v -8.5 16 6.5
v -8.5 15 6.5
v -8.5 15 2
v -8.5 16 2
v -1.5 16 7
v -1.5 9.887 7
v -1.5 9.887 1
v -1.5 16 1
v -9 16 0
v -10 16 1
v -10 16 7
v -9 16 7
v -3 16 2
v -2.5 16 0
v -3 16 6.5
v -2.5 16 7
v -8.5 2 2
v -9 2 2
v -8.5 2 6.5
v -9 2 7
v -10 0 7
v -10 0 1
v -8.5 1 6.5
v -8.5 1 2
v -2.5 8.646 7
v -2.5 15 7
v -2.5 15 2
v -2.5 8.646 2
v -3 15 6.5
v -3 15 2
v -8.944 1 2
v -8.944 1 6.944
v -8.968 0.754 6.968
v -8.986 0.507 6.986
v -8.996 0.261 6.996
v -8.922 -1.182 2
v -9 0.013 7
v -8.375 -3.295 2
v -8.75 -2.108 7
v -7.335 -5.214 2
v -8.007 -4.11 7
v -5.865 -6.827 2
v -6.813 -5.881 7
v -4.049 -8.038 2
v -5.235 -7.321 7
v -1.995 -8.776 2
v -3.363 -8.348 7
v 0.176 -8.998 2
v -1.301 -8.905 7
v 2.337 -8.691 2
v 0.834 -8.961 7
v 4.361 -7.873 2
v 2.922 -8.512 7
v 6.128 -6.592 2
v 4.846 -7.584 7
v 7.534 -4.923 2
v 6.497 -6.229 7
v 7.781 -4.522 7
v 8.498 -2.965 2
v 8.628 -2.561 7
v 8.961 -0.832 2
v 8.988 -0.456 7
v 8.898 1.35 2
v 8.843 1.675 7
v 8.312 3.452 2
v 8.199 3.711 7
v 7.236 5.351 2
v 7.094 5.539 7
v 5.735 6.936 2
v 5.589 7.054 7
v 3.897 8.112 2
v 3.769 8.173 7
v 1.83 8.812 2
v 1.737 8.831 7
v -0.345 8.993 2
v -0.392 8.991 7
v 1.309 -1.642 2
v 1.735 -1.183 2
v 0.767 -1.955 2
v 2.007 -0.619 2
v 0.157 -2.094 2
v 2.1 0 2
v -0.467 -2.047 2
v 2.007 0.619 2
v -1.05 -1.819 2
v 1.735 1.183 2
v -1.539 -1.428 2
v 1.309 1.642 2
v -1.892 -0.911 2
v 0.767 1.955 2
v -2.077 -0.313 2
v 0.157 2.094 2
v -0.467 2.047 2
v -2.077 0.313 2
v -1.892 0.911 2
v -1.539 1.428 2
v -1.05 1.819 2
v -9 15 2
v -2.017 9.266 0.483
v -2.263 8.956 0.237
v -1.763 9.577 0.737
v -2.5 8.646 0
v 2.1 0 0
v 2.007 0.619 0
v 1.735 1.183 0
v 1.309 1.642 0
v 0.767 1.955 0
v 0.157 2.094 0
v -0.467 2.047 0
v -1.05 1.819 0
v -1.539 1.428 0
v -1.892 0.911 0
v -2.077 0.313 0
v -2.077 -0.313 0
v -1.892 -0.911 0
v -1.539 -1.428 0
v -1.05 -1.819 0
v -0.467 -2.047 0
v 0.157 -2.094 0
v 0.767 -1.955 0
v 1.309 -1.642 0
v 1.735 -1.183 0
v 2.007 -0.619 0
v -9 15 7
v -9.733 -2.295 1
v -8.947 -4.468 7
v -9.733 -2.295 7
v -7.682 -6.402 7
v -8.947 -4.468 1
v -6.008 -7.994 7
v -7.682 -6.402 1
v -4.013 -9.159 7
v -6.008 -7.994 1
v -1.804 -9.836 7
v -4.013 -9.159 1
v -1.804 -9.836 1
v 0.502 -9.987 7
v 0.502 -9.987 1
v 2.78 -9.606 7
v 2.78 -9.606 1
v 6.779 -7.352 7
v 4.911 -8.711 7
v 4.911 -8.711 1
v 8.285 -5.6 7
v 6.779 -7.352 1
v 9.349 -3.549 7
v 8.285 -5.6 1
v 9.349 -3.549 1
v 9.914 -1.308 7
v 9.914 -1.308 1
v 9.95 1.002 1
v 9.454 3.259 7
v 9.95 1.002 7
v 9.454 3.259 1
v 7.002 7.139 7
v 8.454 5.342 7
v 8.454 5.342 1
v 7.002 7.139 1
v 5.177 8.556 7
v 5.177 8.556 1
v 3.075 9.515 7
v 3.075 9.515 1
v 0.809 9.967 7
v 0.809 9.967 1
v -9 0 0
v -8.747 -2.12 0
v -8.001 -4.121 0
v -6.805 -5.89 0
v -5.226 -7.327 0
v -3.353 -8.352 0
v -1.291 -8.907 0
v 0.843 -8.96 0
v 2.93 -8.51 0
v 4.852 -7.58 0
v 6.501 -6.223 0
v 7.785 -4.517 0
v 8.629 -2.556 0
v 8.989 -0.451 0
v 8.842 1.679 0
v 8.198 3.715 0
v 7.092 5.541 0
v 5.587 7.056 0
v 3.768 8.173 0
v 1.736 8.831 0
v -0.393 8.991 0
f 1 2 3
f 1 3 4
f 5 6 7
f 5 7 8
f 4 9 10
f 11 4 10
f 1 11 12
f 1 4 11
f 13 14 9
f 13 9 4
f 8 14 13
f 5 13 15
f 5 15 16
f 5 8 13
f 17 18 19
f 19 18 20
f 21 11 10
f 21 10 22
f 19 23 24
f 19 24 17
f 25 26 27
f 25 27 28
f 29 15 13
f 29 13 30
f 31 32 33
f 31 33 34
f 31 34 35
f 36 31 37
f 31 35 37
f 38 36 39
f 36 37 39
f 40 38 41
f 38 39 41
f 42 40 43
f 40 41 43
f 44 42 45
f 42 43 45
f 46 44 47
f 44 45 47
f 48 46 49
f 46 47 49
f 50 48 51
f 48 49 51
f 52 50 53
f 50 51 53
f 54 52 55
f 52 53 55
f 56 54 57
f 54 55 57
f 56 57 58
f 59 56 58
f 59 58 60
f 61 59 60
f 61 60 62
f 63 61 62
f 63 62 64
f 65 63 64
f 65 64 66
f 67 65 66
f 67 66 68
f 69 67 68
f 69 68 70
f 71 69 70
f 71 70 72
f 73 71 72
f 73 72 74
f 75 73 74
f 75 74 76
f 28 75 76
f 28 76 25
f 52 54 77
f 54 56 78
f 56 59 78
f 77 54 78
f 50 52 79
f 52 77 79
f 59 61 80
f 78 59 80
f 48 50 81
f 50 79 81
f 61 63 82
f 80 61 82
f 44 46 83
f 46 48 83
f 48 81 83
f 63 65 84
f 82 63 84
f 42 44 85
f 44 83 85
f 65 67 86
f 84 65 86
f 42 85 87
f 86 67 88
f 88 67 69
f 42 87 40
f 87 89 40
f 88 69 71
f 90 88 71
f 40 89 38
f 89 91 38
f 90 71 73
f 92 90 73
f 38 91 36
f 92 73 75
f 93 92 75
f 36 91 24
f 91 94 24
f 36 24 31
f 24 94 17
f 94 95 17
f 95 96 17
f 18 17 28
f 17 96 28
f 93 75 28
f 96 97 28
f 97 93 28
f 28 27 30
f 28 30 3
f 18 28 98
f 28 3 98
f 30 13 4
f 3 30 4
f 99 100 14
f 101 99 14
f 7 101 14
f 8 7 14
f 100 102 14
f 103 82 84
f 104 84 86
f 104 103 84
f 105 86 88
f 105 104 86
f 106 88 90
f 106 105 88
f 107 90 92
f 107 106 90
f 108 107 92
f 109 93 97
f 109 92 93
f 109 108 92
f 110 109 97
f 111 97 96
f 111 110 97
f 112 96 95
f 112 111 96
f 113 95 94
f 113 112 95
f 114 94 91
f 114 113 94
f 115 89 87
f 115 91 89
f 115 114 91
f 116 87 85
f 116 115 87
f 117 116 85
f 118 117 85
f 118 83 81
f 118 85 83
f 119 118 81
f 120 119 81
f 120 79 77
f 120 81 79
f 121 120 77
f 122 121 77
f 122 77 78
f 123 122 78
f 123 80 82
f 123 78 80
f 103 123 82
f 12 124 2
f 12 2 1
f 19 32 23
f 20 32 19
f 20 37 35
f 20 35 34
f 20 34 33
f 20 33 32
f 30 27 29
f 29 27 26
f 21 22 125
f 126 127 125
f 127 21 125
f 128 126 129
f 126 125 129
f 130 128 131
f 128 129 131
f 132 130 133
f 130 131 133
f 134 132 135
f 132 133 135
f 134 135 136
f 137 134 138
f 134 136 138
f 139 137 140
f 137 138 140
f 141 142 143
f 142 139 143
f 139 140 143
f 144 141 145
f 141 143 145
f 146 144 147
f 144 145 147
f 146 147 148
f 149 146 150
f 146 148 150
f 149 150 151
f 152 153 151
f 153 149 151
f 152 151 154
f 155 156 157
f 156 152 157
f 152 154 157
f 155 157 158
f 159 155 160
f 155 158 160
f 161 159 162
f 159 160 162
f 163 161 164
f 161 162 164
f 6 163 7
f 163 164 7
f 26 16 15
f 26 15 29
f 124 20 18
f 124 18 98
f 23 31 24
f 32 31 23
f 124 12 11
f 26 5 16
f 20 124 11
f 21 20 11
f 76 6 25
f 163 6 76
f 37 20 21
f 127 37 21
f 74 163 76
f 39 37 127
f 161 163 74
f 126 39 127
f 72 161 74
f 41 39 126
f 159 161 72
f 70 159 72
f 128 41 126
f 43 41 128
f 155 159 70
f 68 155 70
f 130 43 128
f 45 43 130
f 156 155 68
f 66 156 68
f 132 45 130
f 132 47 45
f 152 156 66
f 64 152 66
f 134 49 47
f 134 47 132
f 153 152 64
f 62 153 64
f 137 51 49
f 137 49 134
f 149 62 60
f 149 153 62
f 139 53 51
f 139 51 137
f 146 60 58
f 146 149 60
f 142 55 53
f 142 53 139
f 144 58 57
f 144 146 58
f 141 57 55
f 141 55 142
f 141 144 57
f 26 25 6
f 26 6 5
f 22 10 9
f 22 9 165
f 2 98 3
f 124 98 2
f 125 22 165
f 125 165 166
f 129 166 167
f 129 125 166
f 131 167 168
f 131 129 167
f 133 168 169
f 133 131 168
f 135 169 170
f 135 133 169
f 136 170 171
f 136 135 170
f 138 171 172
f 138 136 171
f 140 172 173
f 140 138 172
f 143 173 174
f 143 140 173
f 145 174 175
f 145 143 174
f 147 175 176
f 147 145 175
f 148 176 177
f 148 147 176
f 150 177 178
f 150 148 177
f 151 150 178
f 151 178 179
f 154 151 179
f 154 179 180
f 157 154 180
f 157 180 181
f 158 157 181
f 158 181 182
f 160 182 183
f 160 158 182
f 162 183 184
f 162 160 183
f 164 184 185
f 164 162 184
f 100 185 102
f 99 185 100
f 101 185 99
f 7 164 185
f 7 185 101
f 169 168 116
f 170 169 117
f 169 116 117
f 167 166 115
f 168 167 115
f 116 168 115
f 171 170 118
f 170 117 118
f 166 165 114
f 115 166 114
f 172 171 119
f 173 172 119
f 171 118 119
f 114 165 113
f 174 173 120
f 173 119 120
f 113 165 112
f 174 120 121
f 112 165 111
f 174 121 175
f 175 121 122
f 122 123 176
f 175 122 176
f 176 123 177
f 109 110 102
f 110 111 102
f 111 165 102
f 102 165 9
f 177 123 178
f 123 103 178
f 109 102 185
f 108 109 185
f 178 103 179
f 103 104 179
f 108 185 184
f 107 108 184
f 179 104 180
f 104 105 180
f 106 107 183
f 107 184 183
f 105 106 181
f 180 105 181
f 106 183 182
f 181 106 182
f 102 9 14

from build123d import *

# Parameters (mm, degrees)
F0_R      = 10
F0_R_2    = 2.1
F1_DEPTH  = 7
F2_R      = 9
F3_DEPTH  = 5
F5_DEPTH  = 7
F6_W      = 8.5
F6_H      = 2
F7_DEPTH  = 12.8
F8_W      = 6.5
F8_H      = 5
F9_DEPTH  = 15
F10_W     = 1
F10_H     = 5
F11_DEPTH = 0.5
F12_W     = 1
F12_H     = 5
F13_DEPTH = 0.5
F14_SIZE  = 0.49999
F15_SIZE  = 1


# Not quite as in the source:
# - a fillet or chamfer is up to 0.001 mm smaller than in the source, because OpenCascade refuses the exact size


with BuildPart() as f1:
    # F0 (on Top) → F1 (new body)
    with BuildSketch(Plane.XY):
        Circle(F0_R)
        Circle(F0_R_2, mode=Mode.SUBTRACT)
    extrude(amount=F1_DEPTH)

    # F2 (on face) → F3 (cut)
    with BuildSketch(Plane.XY.offset(7)):
        Circle(F2_R)
    extrude(amount=-F3_DEPTH, mode=Mode.SUBTRACT)

    # F4 (on face) → F5 (join)
    with BuildSketch(Plane.XY.offset(7)):
        with BuildLine():
            Line((-10, 16), (-10, 0))
            ThreePointArc((-10, 0), (-9.7467943448, 2.2360679775), (-9, 4.3588989435))
            Line((-9, 4.3588989435), (-9, 16))
            Line((-9, 16), (-10, 16))
        make_face()
        with BuildLine():
            ThreePointArc((-2.5, 9.6824583655), (-2.0026095485, 9.7974259373), (-1.5, 9.8868599666))
            Line((-1.5, 9.8868599666), (-1.5, 16))
            Line((-1.5, 16), (-2.5, 16))
            Line((-2.5, 16), (-2.5, 9.6824583655))
        make_face()
    extrude(amount=-F5_DEPTH)

    # F6 (on face) → F7 (join)
    with BuildSketch(Plane(origin=(0, 16, 0), x_dir=(-1, 0, 0), z_dir=(0, 1, 0))):
        with Locations((5.75, 1)):
            Rectangle(F6_W, F6_H)
    extrude(amount=-F7_DEPTH)

    # F8 (on face) → F9 (cut)
    with BuildSketch(Plane(origin=(0, 16, 0), x_dir=(-1, 0, 0), z_dir=(0, 1, 0))):
        with Locations((5.75, 4.5)):
            Rectangle(F8_W, F8_H)
    extrude(amount=-F9_DEPTH, mode=Mode.SUBTRACT)

    # F10 (on face) → F11 (join)
    with BuildSketch(Plane.YZ.offset(-9)):
        with Locations((1.5, 4.5)):
            Rectangle(F10_W, F10_H)
        with Locations((15.5, 4.5)):
            Rectangle(F10_W, F10_H)
    extrude(amount=F11_DEPTH)

    # F12 (on face) → F13 (join)
    with BuildSketch(Plane(origin=(-2.5, 0, 0), x_dir=(0, -1, 0), z_dir=(-1, 0, 0))):
        with Locations((-15.5, 4.5)):
            Rectangle(F12_W, F12_H)
    extrude(amount=F13_DEPTH)

    # F14 (size 0.5 in the source; OpenCascade refuses exactly that, so slightly less here)
    f14_edges = [f1.edges().sort_by_distance(p)[0] for p in [
        (-8.5, 1.5, 7),
        (-8.5, 15.5, 7),
        (-3, 15.5, 7),
    ]]
    chamfer(f14_edges, length=F14_SIZE)

    # F15
    f15_edges = [f1.edges().sort_by_distance(p)[0] for p in [
        (7.582875, -6.519202, 0),
        (-1.5, 12.94343, 0),
        (-10, 8, 0),
    ]]
    chamfer(f15_edges, length=F15_SIZE)


solid = f1.part
